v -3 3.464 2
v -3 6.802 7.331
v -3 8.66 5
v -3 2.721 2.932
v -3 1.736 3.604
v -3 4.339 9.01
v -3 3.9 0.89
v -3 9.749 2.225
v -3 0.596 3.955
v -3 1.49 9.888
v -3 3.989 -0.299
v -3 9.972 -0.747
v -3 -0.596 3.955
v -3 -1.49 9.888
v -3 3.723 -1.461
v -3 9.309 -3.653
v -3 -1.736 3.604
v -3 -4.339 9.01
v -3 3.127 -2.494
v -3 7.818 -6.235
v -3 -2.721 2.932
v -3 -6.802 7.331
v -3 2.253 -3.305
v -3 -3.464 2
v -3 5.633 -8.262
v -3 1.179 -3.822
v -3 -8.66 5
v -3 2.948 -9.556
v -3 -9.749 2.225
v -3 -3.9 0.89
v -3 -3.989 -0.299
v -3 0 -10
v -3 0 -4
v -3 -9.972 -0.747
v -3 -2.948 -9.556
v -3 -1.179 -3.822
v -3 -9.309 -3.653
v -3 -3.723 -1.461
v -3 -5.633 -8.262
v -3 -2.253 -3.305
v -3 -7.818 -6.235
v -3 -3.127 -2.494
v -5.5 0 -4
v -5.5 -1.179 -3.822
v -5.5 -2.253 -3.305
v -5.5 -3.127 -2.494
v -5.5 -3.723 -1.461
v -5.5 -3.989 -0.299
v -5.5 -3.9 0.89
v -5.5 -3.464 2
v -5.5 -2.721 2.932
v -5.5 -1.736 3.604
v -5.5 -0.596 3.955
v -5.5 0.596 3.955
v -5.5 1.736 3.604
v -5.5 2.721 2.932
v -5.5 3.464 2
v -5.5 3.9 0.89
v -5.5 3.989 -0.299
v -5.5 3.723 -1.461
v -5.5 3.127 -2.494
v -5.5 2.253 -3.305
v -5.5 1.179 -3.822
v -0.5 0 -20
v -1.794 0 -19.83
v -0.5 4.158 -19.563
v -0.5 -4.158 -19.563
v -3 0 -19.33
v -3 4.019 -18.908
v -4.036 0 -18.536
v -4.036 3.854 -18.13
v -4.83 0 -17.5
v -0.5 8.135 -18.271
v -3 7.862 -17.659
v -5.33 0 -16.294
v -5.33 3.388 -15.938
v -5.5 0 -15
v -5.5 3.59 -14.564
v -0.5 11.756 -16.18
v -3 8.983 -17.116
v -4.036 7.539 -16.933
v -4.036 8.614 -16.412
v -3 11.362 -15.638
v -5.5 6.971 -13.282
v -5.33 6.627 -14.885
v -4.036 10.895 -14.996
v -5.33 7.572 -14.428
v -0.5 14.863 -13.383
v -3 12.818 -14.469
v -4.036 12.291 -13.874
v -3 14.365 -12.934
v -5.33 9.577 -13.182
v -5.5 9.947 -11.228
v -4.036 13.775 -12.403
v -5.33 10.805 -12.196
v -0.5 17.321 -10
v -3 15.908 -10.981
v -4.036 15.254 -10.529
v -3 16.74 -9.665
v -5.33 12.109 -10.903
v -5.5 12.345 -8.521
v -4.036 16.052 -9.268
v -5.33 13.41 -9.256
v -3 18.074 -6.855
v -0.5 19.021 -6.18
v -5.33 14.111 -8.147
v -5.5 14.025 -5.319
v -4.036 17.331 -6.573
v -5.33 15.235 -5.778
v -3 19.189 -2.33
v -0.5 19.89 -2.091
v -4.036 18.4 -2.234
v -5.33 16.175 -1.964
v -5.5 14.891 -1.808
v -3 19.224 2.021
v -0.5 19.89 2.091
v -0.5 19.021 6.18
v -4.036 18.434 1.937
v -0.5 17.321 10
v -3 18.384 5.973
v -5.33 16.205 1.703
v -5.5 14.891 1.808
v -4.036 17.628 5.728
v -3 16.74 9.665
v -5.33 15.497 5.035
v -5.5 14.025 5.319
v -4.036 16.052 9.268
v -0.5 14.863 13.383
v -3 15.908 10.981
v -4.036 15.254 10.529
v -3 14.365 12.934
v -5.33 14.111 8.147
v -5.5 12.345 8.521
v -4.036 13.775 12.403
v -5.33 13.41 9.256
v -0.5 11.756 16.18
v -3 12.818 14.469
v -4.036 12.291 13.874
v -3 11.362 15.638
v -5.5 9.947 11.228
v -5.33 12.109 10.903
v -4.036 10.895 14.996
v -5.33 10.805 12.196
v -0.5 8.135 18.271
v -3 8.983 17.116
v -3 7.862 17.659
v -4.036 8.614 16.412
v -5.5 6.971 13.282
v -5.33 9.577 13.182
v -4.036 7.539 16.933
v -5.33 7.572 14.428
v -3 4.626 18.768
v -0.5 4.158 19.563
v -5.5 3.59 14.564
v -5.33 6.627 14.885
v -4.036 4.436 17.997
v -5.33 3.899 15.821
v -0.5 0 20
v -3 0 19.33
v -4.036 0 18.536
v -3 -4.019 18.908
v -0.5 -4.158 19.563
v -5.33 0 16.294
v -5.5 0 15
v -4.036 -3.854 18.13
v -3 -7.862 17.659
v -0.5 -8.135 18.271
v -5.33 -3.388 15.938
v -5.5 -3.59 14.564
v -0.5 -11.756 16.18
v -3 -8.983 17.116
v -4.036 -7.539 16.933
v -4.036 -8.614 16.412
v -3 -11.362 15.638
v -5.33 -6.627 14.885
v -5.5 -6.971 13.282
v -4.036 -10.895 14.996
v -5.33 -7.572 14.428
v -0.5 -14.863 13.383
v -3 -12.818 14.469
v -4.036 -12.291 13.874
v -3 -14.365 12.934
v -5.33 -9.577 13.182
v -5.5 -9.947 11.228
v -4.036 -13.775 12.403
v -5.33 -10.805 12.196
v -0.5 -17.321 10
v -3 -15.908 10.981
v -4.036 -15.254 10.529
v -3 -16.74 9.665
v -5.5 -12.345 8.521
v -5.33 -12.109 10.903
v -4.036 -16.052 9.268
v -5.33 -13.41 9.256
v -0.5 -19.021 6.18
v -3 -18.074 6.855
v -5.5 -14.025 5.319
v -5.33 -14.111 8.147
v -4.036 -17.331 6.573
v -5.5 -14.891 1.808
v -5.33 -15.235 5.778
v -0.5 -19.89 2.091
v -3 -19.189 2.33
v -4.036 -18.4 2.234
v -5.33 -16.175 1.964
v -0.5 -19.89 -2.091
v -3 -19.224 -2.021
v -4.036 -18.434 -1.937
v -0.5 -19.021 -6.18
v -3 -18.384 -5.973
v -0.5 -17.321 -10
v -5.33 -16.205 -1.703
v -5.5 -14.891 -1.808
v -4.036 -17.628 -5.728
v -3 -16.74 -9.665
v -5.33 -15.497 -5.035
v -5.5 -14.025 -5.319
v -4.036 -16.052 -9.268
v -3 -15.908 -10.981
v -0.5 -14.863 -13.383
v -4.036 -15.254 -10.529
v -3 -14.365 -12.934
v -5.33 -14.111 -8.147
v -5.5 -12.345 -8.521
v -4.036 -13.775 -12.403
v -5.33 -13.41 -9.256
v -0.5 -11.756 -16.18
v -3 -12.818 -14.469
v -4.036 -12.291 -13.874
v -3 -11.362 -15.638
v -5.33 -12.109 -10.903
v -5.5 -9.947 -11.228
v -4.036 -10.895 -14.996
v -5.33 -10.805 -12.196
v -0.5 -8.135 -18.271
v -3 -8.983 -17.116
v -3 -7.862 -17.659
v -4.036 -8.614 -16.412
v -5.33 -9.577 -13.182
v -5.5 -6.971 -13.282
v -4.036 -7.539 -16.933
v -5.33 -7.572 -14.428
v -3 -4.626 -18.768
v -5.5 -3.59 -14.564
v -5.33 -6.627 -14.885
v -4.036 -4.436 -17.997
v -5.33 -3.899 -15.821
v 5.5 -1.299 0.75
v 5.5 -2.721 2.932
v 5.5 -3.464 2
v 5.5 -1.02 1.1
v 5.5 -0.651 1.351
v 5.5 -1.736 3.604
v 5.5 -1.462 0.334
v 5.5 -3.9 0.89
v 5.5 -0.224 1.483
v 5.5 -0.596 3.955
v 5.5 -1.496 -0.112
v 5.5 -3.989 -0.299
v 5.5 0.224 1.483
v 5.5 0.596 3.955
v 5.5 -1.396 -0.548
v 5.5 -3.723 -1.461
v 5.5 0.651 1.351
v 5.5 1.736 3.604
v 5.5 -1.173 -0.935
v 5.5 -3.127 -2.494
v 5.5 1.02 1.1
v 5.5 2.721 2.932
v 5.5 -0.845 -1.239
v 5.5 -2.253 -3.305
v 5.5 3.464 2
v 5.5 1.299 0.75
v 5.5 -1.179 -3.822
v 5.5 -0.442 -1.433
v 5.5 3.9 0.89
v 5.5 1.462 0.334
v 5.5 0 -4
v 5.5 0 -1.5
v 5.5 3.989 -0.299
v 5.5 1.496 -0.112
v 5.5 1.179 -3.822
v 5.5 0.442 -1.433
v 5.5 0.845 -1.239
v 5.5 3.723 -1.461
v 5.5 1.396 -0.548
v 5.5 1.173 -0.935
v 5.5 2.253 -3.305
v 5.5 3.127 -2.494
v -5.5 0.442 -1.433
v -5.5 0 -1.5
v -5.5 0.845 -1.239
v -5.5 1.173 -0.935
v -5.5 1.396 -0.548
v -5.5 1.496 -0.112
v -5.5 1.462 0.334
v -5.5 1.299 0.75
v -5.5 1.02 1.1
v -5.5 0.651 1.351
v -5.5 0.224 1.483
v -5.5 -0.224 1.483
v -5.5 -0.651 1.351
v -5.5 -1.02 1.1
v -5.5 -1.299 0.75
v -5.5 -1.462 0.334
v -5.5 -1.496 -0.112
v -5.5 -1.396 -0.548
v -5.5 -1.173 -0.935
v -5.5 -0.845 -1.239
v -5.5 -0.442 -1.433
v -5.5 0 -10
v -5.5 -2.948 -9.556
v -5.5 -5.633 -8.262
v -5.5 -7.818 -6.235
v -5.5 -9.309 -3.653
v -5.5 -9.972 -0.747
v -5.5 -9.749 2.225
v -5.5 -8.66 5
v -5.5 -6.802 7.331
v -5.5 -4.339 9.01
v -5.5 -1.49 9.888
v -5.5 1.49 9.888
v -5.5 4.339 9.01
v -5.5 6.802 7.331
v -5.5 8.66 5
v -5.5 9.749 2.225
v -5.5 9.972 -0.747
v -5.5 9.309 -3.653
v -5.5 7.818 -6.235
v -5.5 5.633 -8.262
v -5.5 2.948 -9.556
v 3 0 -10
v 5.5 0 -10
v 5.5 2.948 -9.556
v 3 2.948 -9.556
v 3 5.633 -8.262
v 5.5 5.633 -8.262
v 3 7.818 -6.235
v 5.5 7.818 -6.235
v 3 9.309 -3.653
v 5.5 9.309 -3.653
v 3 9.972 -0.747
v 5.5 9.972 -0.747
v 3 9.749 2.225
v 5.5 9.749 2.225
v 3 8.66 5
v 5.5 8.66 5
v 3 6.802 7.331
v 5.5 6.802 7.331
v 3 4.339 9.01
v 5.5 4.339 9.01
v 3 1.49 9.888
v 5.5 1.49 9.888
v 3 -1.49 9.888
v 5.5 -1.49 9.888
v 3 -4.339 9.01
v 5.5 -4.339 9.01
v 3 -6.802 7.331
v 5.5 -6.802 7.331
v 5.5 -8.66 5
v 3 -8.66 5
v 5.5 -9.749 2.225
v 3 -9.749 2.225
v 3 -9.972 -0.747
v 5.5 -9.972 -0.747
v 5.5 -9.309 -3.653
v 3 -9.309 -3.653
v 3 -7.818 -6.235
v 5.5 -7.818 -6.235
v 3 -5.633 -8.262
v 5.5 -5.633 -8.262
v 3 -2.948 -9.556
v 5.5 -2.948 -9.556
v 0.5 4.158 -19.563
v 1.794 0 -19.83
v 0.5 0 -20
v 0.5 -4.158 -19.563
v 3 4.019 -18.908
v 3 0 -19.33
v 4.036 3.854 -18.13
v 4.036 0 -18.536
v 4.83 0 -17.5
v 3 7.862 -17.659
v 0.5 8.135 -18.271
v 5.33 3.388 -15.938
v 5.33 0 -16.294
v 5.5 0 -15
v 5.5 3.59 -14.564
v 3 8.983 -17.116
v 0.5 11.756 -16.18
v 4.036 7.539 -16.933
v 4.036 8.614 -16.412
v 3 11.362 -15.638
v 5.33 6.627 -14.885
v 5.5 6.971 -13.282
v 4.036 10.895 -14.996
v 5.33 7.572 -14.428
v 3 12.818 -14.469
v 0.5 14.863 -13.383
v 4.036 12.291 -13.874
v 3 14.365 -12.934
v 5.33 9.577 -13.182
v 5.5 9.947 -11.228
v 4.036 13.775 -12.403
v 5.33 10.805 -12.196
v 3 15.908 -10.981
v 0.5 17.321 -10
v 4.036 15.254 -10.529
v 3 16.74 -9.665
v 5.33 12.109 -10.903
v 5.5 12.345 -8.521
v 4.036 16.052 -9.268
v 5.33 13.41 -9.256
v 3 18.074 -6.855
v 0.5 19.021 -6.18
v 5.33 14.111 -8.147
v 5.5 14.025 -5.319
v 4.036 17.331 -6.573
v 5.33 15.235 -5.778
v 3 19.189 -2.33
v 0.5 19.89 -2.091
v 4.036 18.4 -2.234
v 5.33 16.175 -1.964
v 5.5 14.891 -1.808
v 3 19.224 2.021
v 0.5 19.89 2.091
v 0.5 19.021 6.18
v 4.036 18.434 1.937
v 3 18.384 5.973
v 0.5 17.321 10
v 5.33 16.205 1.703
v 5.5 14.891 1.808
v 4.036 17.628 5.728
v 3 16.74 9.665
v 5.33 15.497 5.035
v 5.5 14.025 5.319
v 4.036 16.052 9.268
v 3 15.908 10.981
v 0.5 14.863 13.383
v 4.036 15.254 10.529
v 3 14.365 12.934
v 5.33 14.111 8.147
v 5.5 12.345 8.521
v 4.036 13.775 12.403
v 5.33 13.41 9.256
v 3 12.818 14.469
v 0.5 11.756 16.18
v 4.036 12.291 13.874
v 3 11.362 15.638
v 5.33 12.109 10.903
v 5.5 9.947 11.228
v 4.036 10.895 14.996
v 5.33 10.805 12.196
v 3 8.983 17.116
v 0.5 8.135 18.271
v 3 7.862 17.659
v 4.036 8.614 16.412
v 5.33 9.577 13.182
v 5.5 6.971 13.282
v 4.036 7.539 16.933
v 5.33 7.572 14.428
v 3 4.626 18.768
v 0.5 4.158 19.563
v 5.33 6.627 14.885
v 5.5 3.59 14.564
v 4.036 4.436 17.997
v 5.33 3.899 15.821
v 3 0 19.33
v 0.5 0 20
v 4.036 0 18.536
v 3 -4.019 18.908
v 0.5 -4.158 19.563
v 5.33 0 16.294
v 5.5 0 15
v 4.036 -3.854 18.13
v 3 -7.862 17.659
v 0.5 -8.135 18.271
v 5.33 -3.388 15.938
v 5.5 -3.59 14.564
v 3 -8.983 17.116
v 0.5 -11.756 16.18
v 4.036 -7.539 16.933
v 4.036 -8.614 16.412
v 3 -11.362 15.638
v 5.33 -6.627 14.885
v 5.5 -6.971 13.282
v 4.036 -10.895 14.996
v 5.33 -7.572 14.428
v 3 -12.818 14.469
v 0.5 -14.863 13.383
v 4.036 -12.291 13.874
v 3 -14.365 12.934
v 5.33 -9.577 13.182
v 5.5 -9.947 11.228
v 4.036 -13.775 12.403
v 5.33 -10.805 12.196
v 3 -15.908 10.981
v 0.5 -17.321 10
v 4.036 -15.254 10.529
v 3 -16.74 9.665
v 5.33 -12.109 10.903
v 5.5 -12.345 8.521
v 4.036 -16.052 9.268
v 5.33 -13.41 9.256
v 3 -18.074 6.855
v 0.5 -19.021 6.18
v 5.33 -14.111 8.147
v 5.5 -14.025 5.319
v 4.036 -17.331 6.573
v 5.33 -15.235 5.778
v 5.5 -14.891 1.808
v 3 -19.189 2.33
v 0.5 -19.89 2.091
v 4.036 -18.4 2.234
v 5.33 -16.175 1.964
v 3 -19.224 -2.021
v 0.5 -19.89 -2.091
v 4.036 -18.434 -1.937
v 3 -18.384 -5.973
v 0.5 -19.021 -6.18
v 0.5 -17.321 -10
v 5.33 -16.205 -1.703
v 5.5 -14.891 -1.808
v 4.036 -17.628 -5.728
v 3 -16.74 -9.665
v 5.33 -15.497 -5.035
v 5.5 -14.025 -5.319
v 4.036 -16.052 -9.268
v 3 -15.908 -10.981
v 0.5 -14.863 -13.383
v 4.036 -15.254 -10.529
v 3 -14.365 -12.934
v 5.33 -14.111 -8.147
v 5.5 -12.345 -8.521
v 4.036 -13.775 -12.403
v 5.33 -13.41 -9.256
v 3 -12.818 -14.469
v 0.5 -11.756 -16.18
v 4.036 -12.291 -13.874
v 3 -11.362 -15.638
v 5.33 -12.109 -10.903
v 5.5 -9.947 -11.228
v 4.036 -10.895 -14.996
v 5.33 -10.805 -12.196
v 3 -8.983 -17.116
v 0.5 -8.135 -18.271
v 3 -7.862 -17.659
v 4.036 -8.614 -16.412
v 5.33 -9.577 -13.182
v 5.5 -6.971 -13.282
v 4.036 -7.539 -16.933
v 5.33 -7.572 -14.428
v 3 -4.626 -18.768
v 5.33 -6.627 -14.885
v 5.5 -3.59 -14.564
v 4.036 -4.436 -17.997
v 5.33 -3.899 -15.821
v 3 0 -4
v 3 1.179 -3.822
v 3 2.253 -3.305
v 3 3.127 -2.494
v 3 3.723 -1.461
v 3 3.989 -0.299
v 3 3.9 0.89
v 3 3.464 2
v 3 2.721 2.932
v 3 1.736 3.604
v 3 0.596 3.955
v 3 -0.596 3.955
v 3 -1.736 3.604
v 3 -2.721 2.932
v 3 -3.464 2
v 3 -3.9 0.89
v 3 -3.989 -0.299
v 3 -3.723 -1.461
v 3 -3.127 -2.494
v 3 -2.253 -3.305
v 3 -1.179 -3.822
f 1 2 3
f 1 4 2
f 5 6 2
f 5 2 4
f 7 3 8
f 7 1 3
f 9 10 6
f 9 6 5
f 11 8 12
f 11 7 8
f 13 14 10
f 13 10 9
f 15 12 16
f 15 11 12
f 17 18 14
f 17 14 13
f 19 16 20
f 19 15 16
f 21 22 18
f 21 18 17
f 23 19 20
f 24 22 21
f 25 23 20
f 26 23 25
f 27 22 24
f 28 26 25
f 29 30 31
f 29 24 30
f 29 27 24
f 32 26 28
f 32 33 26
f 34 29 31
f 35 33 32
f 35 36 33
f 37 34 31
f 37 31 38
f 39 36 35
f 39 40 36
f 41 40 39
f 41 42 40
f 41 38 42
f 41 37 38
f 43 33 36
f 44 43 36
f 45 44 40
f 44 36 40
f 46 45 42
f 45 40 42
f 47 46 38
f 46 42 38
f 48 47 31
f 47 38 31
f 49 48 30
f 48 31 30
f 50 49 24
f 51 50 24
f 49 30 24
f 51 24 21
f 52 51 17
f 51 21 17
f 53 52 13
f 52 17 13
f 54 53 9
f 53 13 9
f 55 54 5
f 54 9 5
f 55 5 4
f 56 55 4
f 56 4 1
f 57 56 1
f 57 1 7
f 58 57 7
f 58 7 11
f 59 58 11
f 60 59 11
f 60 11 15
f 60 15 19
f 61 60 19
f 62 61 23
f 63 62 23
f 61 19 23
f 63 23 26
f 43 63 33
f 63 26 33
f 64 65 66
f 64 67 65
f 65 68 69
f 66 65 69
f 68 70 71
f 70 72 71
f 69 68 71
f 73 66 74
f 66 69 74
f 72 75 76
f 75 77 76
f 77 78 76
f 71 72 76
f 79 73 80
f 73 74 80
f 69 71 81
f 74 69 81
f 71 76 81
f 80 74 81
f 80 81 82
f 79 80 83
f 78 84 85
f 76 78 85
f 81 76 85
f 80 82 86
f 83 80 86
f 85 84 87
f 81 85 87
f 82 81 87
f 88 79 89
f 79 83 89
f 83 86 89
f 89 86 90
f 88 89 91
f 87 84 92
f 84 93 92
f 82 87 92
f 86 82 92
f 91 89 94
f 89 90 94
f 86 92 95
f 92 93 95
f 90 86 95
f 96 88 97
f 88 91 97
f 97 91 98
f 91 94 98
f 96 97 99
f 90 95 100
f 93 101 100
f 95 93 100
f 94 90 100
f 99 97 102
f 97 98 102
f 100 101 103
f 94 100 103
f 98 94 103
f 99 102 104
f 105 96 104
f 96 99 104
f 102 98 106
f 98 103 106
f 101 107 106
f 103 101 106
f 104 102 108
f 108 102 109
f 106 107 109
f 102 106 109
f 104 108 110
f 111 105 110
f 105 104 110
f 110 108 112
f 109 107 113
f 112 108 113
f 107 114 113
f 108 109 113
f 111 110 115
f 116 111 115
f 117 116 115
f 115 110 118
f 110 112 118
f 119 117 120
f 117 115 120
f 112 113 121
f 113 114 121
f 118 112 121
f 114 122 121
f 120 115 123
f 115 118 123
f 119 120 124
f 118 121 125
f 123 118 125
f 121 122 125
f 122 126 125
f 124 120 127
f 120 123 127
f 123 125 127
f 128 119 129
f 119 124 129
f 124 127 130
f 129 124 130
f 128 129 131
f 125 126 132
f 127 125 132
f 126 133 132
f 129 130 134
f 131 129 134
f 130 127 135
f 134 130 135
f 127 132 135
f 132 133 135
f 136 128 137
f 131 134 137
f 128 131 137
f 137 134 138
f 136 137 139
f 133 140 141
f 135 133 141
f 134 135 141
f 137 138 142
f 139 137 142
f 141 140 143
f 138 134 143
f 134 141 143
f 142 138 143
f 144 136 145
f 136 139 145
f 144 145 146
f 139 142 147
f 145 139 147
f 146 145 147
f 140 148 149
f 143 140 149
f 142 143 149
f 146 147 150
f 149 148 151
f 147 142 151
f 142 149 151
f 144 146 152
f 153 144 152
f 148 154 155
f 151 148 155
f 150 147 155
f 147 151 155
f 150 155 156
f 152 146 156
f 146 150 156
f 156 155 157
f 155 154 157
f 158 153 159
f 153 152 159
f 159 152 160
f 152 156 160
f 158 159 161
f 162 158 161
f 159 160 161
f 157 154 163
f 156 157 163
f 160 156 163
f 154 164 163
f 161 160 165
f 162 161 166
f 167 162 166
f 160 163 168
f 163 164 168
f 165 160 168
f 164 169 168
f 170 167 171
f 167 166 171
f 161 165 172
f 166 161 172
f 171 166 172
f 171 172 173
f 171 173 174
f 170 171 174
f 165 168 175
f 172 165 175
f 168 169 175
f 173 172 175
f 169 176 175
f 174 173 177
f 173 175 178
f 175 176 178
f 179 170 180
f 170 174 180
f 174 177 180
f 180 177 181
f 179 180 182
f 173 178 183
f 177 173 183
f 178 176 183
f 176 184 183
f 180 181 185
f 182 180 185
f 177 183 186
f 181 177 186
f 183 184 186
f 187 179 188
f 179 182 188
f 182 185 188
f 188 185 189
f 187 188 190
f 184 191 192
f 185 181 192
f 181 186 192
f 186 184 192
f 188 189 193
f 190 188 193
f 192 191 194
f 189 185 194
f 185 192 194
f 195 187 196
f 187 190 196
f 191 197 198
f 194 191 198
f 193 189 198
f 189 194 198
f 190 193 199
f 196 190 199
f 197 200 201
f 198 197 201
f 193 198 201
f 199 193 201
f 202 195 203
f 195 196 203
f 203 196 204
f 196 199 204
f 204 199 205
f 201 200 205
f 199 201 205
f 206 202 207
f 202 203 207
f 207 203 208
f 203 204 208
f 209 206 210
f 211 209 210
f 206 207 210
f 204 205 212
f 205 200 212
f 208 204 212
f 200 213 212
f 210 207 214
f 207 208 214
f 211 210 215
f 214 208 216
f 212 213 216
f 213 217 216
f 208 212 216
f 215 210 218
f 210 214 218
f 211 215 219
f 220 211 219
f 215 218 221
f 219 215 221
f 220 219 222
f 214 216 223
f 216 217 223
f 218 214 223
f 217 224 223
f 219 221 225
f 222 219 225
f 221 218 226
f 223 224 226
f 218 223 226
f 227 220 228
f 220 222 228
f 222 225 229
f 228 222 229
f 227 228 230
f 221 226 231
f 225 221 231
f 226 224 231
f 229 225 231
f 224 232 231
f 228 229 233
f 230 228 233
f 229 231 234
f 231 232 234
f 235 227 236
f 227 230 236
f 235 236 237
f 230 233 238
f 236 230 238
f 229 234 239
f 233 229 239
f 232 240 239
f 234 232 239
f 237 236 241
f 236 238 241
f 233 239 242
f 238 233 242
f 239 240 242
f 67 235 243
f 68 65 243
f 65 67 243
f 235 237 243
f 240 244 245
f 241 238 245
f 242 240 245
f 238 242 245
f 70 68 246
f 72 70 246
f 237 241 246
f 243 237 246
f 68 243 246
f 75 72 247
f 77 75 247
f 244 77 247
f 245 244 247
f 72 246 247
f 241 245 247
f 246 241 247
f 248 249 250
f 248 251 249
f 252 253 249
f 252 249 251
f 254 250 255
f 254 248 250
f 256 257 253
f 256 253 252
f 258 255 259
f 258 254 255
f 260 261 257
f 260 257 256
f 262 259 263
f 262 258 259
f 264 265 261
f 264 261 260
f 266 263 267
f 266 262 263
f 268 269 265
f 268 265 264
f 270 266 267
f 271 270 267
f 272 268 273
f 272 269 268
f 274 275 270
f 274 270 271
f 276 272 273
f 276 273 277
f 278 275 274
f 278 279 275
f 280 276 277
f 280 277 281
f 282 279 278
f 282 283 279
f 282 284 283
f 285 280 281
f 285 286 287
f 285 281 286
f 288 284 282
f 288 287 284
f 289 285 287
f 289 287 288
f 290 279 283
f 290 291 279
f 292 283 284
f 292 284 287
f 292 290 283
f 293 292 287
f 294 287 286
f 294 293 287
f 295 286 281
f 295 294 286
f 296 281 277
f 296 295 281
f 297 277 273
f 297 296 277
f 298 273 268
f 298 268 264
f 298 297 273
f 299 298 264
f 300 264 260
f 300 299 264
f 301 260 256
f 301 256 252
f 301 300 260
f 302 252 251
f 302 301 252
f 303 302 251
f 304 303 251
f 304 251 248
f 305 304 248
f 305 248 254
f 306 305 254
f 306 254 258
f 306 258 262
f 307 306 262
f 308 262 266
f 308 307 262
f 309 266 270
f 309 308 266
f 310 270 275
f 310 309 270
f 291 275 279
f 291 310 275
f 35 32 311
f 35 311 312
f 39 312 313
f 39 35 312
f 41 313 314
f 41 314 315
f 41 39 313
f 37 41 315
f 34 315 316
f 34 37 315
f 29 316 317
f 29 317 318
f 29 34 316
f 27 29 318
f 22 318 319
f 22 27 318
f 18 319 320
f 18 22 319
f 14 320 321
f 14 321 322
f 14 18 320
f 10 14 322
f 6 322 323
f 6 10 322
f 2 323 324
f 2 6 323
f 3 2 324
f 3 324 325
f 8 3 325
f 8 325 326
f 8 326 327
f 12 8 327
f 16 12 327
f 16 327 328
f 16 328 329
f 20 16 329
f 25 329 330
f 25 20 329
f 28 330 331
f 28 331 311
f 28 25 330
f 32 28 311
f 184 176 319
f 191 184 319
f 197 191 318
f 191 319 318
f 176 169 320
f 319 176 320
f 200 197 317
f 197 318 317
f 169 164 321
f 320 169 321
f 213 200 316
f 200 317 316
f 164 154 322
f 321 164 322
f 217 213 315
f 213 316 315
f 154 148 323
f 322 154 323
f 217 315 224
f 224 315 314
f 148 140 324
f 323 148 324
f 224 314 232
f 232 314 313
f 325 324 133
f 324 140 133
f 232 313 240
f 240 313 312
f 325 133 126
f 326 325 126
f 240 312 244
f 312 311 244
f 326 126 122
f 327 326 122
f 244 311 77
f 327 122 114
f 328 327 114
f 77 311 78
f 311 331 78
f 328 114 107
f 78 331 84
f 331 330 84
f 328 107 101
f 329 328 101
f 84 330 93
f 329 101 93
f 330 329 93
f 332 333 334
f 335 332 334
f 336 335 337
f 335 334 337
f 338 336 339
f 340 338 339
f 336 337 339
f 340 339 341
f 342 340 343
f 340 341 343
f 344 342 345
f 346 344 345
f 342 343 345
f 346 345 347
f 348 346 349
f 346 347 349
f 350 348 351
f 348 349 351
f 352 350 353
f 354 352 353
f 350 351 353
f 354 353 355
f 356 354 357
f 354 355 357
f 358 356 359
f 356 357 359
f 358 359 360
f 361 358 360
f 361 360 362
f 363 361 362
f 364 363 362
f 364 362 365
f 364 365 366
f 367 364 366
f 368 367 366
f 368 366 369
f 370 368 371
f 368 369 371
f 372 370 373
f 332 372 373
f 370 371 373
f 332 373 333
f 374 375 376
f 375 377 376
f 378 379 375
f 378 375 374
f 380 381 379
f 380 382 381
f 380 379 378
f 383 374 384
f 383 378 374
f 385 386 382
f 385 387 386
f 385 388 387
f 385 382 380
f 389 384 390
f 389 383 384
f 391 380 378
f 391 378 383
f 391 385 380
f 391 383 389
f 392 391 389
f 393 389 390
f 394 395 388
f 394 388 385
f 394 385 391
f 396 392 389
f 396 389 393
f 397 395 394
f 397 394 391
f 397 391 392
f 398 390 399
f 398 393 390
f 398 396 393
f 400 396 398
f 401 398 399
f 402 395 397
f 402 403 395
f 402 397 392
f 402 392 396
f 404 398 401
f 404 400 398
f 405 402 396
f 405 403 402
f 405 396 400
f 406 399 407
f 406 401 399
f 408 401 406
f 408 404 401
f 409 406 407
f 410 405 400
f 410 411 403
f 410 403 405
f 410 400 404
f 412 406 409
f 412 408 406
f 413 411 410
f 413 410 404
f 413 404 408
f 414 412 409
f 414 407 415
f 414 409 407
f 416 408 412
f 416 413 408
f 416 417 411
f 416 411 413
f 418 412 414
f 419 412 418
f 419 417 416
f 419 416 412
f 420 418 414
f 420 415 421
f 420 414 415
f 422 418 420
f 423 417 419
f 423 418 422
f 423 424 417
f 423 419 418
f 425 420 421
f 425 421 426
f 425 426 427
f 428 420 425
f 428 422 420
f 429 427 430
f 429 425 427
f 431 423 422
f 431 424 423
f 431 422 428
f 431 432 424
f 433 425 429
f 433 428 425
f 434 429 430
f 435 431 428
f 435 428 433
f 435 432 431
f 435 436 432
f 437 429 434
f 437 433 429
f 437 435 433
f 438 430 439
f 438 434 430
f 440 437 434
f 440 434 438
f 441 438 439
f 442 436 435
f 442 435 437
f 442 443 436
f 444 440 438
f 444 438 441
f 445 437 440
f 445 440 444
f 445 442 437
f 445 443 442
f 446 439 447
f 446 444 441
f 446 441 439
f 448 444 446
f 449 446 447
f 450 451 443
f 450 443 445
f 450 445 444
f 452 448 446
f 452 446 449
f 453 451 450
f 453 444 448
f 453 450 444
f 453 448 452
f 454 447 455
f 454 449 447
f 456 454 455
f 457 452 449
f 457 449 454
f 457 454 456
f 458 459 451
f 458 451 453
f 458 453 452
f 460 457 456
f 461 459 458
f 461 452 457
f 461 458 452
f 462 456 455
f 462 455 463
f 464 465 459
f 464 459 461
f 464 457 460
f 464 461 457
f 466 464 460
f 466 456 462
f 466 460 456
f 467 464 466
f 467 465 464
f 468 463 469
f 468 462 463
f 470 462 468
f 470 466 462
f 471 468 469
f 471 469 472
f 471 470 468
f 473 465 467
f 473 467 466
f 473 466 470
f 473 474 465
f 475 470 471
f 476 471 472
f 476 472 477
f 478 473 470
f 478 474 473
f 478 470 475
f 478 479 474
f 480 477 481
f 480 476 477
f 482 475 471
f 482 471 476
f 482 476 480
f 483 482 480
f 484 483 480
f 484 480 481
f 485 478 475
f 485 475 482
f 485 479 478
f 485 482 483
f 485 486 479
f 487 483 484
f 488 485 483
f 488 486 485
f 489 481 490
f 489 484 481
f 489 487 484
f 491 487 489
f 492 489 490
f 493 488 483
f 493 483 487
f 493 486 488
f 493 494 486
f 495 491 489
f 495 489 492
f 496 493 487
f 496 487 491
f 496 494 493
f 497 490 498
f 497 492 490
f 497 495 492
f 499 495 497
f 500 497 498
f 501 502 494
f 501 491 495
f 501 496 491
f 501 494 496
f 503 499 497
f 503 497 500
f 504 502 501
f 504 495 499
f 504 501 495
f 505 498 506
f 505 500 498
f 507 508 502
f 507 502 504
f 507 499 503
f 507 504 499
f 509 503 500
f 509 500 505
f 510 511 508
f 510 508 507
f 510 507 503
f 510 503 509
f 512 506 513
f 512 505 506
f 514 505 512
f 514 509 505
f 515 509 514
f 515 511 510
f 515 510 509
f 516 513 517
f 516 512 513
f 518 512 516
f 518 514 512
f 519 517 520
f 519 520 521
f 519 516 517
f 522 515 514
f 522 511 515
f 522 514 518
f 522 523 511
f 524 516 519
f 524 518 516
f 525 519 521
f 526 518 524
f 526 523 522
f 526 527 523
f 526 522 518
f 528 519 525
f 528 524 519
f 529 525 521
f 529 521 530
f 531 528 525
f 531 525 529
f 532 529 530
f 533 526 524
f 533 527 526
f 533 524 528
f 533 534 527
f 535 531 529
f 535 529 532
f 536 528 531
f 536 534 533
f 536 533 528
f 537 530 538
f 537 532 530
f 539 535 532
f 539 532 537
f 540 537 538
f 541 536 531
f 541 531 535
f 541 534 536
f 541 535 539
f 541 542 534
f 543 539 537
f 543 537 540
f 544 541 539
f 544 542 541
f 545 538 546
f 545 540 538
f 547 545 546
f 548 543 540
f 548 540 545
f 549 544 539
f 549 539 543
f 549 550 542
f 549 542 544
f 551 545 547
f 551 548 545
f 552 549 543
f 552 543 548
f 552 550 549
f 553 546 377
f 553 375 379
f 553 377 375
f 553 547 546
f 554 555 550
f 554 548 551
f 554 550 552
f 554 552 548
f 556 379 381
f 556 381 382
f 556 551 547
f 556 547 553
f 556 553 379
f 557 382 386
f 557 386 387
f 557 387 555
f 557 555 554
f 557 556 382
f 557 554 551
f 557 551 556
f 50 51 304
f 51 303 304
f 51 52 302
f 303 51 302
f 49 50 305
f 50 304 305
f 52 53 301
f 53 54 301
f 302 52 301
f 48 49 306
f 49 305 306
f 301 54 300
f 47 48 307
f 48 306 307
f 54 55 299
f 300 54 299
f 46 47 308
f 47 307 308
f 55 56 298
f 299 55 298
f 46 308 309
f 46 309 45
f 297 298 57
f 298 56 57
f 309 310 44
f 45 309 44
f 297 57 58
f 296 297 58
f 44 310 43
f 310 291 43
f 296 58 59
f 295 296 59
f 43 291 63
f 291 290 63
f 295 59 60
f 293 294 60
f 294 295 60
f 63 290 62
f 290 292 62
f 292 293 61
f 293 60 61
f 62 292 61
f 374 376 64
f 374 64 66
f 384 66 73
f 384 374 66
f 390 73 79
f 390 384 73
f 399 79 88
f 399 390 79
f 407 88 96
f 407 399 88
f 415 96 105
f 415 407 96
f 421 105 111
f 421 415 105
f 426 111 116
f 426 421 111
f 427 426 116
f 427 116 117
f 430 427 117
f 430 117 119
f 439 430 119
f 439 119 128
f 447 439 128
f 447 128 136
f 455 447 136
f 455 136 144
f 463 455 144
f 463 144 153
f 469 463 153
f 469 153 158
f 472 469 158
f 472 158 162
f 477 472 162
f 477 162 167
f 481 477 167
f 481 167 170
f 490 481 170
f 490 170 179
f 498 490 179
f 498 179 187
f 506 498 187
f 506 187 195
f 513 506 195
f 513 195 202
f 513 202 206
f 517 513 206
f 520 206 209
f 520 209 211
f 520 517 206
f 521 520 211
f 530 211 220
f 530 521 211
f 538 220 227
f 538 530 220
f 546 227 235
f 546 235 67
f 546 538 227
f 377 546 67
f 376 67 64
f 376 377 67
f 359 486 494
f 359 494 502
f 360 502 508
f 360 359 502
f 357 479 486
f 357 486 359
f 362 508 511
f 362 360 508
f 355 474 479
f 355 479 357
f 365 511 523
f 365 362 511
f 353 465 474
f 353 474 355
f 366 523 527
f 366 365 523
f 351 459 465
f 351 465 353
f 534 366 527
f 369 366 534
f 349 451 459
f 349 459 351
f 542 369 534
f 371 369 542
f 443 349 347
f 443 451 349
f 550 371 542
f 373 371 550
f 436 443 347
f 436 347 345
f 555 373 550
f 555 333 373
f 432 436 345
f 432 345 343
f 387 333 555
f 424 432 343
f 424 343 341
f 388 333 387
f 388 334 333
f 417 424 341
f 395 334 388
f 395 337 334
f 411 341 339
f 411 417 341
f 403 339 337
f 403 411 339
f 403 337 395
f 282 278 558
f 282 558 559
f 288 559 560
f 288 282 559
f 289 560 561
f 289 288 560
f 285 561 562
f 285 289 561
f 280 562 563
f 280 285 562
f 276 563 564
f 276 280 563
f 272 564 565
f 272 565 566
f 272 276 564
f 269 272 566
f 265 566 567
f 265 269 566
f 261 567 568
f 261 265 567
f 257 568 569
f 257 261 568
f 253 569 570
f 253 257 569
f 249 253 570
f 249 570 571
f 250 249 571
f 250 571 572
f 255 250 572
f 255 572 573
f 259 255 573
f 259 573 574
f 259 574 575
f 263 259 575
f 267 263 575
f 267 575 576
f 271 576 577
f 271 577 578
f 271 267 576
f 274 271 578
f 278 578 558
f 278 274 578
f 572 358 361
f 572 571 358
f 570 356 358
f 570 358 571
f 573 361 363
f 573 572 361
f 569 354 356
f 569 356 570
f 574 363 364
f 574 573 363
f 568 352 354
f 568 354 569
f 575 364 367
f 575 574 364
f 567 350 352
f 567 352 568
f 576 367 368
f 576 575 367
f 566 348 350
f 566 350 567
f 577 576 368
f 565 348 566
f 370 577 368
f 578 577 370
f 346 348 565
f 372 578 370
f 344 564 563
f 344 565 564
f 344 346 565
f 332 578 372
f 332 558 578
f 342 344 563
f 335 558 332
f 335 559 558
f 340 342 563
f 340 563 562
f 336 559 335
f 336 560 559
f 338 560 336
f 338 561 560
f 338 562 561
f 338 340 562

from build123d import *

# Parameters (mm, degrees)
SKETCH2_R           = 20
SKETCH2_R_2         = 1.5
BOSS_EXTRUDE1_DEPTH = 5.5
FILLET1_R           = 5
SKETCH3_R           = 10
SKETCH3_R_2         = 4
CUT_EXTRUDE1_DEPTH  = 2.5
CUT_EXTRUDE2_START  = -2.5
SKETCH4_R           = 10
SKETCH4_R_2         = 4
CUT_EXTRUDE2_DEPTH  = 2.5


with BuildPart() as part:
    # Sketch2 → Boss-Extrude1 (new, symmetric)
    with BuildSketch(Plane(origin=(0, 0, 0), x_dir=(0, 0, -1), z_dir=(1, 0, 0))):
        Circle(SKETCH2_R)
        Circle(SKETCH2_R_2, mode=Mode.SUBTRACT)
    extrude(amount=BOSS_EXTRUDE1_DEPTH, both=True)

    # Fillet1
    fillet1_edges = [part.edges().sort_by_distance(p)[0] for p in [
        (-5.5, 0, 20),
        (5.5, 0, 20),
    ]]
    fillet(fillet1_edges, radius=FILLET1_R)

    # Sketch3 → Cut-Extrude1 (cut)
    with BuildSketch(Plane(origin=(5.5, 0, 0), x_dir=(0, 0, -1), z_dir=(1, 0, 0))):
        Circle(SKETCH3_R)
        Circle(SKETCH3_R_2, mode=Mode.SUBTRACT)
    extrude(amount=-CUT_EXTRUDE1_DEPTH, mode=Mode.SUBTRACT)

    # Sketch4 → Cut-Extrude2 (cut)
    with BuildSketch(Plane.ZY.offset(5.5).offset(CUT_EXTRUDE2_START)):
        with Locations(Location((0, 0, 0), (0, 0, 180))):
            Circle(SKETCH4_R)
        with Locations(Location((0, 0, 0), (0, 0, 180))):
            Circle(SKETCH4_R_2, mode=Mode.SUBTRACT)
    extrude(amount=CUT_EXTRUDE2_DEPTH, mode=Mode.SUBTRACT)


solid = part.part
